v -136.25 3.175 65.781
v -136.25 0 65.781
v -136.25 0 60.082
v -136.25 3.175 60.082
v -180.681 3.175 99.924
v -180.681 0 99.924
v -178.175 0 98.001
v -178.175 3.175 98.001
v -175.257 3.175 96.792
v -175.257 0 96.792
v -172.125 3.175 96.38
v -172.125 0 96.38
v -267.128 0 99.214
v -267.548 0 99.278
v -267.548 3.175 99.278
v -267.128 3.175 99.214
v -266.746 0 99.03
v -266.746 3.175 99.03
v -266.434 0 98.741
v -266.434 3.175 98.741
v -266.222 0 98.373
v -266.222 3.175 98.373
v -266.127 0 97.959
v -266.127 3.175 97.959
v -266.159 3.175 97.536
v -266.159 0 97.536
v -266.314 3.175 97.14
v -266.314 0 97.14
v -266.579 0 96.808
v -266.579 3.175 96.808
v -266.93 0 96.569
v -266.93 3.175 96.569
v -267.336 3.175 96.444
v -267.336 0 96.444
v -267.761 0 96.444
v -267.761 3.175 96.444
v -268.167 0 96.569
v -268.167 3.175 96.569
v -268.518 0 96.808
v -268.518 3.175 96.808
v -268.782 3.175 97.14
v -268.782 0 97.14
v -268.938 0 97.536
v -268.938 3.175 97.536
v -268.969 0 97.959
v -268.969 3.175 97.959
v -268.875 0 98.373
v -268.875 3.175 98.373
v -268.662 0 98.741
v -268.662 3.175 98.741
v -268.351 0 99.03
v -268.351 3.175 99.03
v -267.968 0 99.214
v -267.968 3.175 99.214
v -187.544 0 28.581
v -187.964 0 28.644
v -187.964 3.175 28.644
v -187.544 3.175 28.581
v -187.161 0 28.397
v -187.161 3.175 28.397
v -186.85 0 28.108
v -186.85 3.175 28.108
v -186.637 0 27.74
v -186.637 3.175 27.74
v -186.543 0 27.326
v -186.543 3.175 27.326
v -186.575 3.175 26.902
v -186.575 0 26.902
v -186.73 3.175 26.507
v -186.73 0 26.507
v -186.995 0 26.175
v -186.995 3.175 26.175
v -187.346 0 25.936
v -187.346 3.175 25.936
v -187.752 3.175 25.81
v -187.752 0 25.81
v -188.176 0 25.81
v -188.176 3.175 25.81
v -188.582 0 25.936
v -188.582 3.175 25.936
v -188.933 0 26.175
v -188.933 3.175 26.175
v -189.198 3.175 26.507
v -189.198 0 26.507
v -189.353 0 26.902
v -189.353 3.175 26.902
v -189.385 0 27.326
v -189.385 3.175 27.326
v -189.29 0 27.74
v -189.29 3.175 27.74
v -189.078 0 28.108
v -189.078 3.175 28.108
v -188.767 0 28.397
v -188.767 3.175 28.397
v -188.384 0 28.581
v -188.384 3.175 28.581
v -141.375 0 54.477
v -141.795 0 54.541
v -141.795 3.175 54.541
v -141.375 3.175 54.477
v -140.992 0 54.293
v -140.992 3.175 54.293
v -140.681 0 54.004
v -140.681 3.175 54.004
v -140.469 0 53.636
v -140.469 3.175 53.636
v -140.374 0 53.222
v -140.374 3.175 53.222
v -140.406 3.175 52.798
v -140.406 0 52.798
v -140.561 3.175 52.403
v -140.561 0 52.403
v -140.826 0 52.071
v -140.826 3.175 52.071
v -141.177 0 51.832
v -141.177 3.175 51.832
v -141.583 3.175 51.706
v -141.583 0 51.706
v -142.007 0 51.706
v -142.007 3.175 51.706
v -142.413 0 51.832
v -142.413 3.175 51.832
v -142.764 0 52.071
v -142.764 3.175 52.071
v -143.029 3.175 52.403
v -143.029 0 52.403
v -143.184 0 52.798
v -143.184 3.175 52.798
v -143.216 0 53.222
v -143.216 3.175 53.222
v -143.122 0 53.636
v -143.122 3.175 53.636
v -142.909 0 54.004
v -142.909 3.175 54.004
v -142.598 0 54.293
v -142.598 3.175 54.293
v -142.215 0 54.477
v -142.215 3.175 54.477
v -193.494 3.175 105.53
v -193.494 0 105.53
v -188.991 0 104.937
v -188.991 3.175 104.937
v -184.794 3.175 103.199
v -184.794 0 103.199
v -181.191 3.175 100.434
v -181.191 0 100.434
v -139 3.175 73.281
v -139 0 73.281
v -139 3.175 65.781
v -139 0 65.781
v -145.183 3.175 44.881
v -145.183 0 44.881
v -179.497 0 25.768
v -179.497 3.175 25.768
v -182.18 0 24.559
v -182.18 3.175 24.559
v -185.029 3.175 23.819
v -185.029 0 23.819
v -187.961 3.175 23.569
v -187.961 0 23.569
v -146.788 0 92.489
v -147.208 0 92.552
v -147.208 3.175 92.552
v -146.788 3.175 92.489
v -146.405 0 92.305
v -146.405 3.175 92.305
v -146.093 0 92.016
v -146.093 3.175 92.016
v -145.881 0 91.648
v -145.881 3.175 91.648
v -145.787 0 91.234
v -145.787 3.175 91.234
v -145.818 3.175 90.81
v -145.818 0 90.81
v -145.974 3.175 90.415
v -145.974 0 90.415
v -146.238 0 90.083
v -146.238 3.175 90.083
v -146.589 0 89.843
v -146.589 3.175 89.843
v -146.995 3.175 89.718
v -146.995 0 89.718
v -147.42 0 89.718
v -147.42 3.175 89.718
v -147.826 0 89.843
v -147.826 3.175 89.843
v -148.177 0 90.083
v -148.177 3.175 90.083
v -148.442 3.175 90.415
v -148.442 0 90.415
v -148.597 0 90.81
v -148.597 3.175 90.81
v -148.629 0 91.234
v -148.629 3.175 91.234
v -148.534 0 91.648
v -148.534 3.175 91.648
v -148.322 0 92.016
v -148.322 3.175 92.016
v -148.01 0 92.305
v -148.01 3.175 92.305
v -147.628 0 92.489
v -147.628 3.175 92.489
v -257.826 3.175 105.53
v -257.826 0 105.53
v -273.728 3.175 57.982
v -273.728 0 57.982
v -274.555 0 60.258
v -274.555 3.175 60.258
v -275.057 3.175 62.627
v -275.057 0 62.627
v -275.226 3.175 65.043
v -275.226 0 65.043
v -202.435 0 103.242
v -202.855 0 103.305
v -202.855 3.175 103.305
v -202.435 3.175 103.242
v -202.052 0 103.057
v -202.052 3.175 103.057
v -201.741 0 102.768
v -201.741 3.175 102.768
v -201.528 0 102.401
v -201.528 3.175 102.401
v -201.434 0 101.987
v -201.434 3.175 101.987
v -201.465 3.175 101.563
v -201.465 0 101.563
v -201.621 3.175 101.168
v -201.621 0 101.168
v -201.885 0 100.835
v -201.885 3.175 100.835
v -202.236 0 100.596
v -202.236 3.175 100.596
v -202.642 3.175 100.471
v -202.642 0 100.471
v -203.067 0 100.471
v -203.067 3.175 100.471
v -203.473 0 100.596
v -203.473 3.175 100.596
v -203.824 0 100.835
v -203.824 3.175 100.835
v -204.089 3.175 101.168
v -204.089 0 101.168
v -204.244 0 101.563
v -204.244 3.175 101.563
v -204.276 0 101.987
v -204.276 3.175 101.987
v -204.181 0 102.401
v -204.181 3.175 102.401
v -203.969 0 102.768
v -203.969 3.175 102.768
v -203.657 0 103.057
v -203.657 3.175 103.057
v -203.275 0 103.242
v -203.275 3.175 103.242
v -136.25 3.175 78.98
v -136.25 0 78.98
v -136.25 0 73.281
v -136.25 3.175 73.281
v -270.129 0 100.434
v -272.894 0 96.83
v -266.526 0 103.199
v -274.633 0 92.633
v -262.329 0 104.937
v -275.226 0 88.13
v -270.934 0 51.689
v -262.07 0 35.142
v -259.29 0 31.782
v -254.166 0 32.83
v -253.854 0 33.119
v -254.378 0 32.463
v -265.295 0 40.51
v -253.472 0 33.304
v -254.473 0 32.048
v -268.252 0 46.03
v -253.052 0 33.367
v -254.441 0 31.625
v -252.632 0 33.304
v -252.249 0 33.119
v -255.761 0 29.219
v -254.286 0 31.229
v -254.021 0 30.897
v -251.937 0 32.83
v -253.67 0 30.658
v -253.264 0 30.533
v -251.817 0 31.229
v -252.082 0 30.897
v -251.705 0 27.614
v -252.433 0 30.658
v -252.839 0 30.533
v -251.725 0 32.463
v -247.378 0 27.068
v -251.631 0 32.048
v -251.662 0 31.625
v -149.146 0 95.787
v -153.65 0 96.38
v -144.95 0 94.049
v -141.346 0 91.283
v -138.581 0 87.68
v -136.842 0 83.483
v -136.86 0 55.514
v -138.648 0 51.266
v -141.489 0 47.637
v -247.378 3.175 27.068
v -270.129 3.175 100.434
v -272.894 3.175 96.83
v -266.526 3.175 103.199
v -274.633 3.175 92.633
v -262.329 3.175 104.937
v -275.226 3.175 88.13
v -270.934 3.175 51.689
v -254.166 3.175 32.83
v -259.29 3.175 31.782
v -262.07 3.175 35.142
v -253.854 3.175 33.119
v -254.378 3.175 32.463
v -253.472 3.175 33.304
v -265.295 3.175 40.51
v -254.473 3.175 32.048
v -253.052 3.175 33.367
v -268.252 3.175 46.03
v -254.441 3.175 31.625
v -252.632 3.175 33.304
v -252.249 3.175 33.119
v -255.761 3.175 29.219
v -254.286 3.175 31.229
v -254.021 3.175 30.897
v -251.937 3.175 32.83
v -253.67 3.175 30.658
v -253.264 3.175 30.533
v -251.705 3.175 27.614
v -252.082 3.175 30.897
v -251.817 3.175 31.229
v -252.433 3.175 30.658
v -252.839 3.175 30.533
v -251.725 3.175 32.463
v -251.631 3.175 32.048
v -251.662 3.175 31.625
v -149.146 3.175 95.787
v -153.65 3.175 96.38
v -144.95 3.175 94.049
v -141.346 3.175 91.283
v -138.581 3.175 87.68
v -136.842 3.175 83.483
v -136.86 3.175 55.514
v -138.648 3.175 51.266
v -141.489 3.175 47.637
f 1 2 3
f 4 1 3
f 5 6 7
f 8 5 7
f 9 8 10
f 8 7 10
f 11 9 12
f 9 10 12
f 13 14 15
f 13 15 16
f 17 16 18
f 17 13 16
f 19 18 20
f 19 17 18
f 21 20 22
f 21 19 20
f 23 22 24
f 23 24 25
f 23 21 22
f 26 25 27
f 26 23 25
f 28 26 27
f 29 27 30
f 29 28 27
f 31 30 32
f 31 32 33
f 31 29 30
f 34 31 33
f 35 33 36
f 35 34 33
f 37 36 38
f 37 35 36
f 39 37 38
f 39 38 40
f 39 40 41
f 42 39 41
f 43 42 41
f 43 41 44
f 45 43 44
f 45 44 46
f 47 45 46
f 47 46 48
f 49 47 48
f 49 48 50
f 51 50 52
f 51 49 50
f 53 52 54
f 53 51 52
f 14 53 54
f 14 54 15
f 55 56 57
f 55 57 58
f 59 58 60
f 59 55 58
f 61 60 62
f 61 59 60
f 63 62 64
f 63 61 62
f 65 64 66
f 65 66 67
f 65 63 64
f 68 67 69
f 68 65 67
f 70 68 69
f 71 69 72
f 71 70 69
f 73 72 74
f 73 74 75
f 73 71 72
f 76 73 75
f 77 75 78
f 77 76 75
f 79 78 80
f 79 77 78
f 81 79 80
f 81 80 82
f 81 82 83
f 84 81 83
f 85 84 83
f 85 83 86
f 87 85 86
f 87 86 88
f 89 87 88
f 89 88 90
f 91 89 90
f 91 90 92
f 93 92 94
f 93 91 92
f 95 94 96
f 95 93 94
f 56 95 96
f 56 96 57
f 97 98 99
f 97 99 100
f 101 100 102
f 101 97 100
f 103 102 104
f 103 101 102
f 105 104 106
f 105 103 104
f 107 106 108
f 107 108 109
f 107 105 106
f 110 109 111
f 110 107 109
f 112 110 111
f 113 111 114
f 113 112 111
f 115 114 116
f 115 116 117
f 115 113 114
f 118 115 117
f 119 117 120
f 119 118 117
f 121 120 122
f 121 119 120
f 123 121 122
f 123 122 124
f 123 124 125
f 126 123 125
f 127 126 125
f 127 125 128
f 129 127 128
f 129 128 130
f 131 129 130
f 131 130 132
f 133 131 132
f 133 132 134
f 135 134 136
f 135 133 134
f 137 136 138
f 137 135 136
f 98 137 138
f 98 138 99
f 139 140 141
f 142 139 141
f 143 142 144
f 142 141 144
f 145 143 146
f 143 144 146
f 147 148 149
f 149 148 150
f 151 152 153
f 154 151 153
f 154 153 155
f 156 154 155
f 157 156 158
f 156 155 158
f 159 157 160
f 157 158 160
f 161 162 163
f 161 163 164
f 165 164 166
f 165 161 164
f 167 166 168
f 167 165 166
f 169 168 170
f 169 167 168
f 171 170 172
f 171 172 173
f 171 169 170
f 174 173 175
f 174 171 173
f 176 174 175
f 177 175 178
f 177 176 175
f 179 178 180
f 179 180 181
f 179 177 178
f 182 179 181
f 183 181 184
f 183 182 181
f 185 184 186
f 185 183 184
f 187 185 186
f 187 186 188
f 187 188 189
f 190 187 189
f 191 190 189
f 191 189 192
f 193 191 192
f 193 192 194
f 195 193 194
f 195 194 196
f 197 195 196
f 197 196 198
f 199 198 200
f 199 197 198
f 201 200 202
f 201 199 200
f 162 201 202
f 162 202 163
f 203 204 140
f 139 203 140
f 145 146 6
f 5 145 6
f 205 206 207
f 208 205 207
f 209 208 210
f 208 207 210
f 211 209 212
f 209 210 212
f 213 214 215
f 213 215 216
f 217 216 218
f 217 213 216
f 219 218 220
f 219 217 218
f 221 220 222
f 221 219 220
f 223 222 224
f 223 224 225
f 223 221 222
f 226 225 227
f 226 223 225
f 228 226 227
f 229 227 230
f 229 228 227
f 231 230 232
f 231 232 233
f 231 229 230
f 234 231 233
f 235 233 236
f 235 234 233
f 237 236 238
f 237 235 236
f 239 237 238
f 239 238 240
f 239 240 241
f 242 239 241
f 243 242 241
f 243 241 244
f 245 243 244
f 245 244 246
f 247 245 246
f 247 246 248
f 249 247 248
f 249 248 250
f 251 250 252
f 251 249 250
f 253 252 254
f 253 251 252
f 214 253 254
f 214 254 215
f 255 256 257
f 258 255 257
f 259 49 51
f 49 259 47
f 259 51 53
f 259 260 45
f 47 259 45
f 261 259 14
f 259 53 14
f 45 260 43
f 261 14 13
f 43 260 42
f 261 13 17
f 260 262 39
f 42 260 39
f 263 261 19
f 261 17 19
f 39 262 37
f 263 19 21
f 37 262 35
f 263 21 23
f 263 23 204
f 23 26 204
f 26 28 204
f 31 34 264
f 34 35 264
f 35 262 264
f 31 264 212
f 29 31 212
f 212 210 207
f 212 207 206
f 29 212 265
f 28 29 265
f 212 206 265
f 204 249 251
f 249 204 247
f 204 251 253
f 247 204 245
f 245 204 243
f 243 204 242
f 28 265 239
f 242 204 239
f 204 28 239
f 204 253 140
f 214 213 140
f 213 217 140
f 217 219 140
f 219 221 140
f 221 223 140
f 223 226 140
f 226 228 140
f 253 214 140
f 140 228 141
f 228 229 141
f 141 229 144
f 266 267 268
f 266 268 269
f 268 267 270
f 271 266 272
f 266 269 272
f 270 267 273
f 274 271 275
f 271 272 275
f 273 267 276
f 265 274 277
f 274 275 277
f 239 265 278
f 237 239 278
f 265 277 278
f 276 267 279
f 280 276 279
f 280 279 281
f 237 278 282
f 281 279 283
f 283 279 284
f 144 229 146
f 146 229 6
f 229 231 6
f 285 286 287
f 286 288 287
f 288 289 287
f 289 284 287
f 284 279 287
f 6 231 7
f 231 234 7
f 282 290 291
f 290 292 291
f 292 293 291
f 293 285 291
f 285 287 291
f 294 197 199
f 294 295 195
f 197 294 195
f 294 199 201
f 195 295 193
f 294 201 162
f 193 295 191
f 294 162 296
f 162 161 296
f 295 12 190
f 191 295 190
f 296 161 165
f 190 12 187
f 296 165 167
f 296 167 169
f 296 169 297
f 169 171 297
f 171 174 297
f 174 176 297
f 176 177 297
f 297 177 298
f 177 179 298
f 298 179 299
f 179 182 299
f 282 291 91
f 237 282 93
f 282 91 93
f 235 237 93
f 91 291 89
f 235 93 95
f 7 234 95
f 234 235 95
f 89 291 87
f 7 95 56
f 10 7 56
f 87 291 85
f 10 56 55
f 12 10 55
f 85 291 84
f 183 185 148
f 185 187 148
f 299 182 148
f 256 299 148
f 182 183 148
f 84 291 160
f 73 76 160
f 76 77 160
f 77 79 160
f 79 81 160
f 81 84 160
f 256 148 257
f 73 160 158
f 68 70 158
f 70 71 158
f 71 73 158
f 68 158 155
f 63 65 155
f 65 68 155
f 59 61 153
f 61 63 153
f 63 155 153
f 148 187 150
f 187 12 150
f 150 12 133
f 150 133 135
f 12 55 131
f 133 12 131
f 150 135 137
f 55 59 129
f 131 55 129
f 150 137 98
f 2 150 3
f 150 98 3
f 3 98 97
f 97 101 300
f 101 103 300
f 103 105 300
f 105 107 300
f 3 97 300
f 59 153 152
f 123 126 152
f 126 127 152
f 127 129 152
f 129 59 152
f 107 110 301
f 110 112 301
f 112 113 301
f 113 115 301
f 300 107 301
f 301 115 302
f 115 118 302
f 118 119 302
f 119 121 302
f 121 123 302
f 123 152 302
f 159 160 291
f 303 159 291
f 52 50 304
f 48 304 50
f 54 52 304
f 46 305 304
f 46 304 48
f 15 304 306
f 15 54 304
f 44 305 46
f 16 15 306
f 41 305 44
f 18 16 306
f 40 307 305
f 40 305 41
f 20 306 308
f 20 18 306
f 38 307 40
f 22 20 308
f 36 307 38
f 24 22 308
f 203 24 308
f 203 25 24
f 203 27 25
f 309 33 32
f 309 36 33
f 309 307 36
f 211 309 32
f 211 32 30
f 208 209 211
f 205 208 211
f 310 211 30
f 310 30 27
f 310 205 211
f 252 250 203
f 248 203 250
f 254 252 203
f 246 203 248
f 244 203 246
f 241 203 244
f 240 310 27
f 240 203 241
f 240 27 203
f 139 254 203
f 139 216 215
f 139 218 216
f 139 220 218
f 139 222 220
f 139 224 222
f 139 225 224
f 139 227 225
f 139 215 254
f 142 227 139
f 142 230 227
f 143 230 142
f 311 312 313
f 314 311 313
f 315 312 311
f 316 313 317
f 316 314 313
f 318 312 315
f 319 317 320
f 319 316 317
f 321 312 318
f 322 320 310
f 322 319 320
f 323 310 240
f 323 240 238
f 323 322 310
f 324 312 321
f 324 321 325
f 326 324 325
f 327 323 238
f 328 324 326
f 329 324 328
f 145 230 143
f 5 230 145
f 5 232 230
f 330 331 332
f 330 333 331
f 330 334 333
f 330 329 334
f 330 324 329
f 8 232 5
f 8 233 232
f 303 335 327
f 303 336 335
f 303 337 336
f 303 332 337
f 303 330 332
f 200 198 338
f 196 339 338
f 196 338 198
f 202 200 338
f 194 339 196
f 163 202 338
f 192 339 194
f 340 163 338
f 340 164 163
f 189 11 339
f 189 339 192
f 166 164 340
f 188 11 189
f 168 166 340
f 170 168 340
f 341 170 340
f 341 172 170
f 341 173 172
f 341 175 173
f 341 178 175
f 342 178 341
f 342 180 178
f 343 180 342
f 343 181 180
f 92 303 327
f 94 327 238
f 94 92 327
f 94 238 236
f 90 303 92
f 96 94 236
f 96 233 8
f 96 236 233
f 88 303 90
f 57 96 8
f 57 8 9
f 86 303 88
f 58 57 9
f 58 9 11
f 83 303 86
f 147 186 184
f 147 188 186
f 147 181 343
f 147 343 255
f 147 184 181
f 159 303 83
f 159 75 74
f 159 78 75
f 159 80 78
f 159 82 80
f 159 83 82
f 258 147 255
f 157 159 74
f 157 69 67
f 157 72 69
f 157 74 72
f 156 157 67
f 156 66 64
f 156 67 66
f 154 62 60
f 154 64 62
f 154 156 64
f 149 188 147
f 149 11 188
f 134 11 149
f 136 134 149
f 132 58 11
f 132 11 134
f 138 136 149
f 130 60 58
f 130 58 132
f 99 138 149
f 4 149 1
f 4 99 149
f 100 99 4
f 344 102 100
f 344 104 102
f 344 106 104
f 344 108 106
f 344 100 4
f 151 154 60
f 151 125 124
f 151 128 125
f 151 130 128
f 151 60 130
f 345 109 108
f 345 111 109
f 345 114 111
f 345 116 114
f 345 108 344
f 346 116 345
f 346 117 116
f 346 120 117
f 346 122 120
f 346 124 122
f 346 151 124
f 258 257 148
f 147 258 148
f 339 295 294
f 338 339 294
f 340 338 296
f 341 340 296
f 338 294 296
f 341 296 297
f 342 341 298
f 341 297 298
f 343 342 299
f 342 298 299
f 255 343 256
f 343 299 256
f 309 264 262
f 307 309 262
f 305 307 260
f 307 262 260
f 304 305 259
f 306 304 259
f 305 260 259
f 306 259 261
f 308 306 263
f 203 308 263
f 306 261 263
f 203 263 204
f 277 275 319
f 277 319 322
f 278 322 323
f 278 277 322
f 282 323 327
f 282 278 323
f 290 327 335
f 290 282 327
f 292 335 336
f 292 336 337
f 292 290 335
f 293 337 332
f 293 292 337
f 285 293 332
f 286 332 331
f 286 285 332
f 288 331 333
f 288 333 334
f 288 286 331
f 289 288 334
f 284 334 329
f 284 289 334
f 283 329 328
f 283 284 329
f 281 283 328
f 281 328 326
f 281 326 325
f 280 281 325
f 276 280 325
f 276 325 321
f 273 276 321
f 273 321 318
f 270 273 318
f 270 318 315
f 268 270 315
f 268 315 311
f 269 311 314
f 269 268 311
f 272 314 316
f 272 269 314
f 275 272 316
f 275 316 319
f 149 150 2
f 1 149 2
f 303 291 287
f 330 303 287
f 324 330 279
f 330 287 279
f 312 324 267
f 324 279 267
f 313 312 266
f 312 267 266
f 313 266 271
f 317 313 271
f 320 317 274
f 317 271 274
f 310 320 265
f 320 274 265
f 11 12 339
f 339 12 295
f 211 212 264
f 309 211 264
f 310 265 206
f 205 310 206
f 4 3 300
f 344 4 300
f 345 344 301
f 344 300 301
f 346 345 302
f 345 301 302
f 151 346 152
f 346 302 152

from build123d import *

# Parameters (mm, degrees)
SKETCH2_R           = 1.425
BOSS_EXTRUDE1_DEPTH = 3.175


with BuildPart() as part:
    # Sketch2 → Boss-Extrude1 (new body)
    with BuildSketch(Plane(origin=(0, 0, 0), x_dir=(1, 0, 0), z_dir=(0, 1, 0))):
        with BuildLine():
            Line((-145.18277075, -44.880968233), (-179.497120097, -25.768390824))
            ThreePointArc((-179.497120097, -25.768390824), (-183.588653035, -24.128556812), (-187.960968922, -23.569494069))
            Line((-187.960968922, -23.569494069), (-247.377604545, -27.068041697))
            ThreePointArc((-247.377604545, -27.068041697), (-255.760524502, -29.218913898), (-262.07032604, -35.142257782))
            ThreePointArc((-262.07032604, -35.142257782), (-266.807761783, -43.251676507), (-270.933745897, -51.688632391))
            Line((-270.933745897, -51.688632391), (-273.728235609, -57.981701498))
            ThreePointArc((-273.728235609, -57.981701498), (-274.847170355, -61.434035543), (-275.2256366, -65.043382939))
            Line((-275.2256366, -65.043382939), (-275.2256366, -88.130010281))
            ThreePointArc((-275.2256366, -88.130010281), (-270.129294593, -100.433668273), (-257.8256366, -105.530010281))
            Line((-257.8256366, -105.530010281), (-193.494425739, -105.530010281))
            ThreePointArc((-193.494425739, -105.530010281), (-186.835734016, -104.205514146), (-181.190767747, -100.433668273))
            Line((-181.190767747, -100.433668273), (-180.680815133, -99.923715659))
            ThreePointArc((-180.680815133, -99.923715659), (-176.755292612, -97.300765368), (-172.12482308, -96.379707712))
            Line((-172.12482308, -96.379707712), (-153.649556898, -96.379707712))
            ThreePointArc((-153.649556898, -96.379707712), (-141.345898905, -91.283365704), (-136.249556898, -78.979707712))
            Line((-136.249556898, -78.979707712), (-136.249556898, -73.280889471))
            Line((-136.249556898, -73.280889471), (-138.999556898, -73.280889471))
            Line((-138.999556898, -73.280889471), (-138.999556898, -65.780889471))
            Line((-138.999556898, -65.780889471), (-136.249556898, -65.780889471))
            Line((-136.249556898, -65.780889471), (-136.249556898, -60.08207123))
            ThreePointArc((-136.249556898, -60.08207123), (-138.648188978, -51.266235449), (-145.18277075, -44.880968233))
        make_face()
        with Locations(Location((-147.207602145, -91.127288498, 0), (0, 0, 270))):
            Circle(SKETCH2_R, mode=Mode.SUBTRACT)
        with Locations(Location((-141.795027651, -53.115534334, 0), (0, 0, 270))):
            Circle(SKETCH2_R, mode=Mode.SUBTRACT)
        with Locations(Location((-187.963906245, -27.219493821, 0), (0, 0, 270))):
            Circle(SKETCH2_R, mode=Mode.SUBTRACT)
        with Locations(Location((-253.051529835, -31.941972813, 0), (0, 0, 270))):
            Circle(SKETCH2_R, mode=Mode.SUBTRACT)
        with Locations(Location((-267.548354841, -97.852728522, 0), (0, 0, 270))):
            Circle(SKETCH2_R, mode=Mode.SUBTRACT)
        with Locations(Location((-202.85468144, -101.880010281, 0), (0, 0, 270))):
            Circle(SKETCH2_R, mode=Mode.SUBTRACT)
    extrude(amount=BOSS_EXTRUDE1_DEPTH)


solid = part.part
